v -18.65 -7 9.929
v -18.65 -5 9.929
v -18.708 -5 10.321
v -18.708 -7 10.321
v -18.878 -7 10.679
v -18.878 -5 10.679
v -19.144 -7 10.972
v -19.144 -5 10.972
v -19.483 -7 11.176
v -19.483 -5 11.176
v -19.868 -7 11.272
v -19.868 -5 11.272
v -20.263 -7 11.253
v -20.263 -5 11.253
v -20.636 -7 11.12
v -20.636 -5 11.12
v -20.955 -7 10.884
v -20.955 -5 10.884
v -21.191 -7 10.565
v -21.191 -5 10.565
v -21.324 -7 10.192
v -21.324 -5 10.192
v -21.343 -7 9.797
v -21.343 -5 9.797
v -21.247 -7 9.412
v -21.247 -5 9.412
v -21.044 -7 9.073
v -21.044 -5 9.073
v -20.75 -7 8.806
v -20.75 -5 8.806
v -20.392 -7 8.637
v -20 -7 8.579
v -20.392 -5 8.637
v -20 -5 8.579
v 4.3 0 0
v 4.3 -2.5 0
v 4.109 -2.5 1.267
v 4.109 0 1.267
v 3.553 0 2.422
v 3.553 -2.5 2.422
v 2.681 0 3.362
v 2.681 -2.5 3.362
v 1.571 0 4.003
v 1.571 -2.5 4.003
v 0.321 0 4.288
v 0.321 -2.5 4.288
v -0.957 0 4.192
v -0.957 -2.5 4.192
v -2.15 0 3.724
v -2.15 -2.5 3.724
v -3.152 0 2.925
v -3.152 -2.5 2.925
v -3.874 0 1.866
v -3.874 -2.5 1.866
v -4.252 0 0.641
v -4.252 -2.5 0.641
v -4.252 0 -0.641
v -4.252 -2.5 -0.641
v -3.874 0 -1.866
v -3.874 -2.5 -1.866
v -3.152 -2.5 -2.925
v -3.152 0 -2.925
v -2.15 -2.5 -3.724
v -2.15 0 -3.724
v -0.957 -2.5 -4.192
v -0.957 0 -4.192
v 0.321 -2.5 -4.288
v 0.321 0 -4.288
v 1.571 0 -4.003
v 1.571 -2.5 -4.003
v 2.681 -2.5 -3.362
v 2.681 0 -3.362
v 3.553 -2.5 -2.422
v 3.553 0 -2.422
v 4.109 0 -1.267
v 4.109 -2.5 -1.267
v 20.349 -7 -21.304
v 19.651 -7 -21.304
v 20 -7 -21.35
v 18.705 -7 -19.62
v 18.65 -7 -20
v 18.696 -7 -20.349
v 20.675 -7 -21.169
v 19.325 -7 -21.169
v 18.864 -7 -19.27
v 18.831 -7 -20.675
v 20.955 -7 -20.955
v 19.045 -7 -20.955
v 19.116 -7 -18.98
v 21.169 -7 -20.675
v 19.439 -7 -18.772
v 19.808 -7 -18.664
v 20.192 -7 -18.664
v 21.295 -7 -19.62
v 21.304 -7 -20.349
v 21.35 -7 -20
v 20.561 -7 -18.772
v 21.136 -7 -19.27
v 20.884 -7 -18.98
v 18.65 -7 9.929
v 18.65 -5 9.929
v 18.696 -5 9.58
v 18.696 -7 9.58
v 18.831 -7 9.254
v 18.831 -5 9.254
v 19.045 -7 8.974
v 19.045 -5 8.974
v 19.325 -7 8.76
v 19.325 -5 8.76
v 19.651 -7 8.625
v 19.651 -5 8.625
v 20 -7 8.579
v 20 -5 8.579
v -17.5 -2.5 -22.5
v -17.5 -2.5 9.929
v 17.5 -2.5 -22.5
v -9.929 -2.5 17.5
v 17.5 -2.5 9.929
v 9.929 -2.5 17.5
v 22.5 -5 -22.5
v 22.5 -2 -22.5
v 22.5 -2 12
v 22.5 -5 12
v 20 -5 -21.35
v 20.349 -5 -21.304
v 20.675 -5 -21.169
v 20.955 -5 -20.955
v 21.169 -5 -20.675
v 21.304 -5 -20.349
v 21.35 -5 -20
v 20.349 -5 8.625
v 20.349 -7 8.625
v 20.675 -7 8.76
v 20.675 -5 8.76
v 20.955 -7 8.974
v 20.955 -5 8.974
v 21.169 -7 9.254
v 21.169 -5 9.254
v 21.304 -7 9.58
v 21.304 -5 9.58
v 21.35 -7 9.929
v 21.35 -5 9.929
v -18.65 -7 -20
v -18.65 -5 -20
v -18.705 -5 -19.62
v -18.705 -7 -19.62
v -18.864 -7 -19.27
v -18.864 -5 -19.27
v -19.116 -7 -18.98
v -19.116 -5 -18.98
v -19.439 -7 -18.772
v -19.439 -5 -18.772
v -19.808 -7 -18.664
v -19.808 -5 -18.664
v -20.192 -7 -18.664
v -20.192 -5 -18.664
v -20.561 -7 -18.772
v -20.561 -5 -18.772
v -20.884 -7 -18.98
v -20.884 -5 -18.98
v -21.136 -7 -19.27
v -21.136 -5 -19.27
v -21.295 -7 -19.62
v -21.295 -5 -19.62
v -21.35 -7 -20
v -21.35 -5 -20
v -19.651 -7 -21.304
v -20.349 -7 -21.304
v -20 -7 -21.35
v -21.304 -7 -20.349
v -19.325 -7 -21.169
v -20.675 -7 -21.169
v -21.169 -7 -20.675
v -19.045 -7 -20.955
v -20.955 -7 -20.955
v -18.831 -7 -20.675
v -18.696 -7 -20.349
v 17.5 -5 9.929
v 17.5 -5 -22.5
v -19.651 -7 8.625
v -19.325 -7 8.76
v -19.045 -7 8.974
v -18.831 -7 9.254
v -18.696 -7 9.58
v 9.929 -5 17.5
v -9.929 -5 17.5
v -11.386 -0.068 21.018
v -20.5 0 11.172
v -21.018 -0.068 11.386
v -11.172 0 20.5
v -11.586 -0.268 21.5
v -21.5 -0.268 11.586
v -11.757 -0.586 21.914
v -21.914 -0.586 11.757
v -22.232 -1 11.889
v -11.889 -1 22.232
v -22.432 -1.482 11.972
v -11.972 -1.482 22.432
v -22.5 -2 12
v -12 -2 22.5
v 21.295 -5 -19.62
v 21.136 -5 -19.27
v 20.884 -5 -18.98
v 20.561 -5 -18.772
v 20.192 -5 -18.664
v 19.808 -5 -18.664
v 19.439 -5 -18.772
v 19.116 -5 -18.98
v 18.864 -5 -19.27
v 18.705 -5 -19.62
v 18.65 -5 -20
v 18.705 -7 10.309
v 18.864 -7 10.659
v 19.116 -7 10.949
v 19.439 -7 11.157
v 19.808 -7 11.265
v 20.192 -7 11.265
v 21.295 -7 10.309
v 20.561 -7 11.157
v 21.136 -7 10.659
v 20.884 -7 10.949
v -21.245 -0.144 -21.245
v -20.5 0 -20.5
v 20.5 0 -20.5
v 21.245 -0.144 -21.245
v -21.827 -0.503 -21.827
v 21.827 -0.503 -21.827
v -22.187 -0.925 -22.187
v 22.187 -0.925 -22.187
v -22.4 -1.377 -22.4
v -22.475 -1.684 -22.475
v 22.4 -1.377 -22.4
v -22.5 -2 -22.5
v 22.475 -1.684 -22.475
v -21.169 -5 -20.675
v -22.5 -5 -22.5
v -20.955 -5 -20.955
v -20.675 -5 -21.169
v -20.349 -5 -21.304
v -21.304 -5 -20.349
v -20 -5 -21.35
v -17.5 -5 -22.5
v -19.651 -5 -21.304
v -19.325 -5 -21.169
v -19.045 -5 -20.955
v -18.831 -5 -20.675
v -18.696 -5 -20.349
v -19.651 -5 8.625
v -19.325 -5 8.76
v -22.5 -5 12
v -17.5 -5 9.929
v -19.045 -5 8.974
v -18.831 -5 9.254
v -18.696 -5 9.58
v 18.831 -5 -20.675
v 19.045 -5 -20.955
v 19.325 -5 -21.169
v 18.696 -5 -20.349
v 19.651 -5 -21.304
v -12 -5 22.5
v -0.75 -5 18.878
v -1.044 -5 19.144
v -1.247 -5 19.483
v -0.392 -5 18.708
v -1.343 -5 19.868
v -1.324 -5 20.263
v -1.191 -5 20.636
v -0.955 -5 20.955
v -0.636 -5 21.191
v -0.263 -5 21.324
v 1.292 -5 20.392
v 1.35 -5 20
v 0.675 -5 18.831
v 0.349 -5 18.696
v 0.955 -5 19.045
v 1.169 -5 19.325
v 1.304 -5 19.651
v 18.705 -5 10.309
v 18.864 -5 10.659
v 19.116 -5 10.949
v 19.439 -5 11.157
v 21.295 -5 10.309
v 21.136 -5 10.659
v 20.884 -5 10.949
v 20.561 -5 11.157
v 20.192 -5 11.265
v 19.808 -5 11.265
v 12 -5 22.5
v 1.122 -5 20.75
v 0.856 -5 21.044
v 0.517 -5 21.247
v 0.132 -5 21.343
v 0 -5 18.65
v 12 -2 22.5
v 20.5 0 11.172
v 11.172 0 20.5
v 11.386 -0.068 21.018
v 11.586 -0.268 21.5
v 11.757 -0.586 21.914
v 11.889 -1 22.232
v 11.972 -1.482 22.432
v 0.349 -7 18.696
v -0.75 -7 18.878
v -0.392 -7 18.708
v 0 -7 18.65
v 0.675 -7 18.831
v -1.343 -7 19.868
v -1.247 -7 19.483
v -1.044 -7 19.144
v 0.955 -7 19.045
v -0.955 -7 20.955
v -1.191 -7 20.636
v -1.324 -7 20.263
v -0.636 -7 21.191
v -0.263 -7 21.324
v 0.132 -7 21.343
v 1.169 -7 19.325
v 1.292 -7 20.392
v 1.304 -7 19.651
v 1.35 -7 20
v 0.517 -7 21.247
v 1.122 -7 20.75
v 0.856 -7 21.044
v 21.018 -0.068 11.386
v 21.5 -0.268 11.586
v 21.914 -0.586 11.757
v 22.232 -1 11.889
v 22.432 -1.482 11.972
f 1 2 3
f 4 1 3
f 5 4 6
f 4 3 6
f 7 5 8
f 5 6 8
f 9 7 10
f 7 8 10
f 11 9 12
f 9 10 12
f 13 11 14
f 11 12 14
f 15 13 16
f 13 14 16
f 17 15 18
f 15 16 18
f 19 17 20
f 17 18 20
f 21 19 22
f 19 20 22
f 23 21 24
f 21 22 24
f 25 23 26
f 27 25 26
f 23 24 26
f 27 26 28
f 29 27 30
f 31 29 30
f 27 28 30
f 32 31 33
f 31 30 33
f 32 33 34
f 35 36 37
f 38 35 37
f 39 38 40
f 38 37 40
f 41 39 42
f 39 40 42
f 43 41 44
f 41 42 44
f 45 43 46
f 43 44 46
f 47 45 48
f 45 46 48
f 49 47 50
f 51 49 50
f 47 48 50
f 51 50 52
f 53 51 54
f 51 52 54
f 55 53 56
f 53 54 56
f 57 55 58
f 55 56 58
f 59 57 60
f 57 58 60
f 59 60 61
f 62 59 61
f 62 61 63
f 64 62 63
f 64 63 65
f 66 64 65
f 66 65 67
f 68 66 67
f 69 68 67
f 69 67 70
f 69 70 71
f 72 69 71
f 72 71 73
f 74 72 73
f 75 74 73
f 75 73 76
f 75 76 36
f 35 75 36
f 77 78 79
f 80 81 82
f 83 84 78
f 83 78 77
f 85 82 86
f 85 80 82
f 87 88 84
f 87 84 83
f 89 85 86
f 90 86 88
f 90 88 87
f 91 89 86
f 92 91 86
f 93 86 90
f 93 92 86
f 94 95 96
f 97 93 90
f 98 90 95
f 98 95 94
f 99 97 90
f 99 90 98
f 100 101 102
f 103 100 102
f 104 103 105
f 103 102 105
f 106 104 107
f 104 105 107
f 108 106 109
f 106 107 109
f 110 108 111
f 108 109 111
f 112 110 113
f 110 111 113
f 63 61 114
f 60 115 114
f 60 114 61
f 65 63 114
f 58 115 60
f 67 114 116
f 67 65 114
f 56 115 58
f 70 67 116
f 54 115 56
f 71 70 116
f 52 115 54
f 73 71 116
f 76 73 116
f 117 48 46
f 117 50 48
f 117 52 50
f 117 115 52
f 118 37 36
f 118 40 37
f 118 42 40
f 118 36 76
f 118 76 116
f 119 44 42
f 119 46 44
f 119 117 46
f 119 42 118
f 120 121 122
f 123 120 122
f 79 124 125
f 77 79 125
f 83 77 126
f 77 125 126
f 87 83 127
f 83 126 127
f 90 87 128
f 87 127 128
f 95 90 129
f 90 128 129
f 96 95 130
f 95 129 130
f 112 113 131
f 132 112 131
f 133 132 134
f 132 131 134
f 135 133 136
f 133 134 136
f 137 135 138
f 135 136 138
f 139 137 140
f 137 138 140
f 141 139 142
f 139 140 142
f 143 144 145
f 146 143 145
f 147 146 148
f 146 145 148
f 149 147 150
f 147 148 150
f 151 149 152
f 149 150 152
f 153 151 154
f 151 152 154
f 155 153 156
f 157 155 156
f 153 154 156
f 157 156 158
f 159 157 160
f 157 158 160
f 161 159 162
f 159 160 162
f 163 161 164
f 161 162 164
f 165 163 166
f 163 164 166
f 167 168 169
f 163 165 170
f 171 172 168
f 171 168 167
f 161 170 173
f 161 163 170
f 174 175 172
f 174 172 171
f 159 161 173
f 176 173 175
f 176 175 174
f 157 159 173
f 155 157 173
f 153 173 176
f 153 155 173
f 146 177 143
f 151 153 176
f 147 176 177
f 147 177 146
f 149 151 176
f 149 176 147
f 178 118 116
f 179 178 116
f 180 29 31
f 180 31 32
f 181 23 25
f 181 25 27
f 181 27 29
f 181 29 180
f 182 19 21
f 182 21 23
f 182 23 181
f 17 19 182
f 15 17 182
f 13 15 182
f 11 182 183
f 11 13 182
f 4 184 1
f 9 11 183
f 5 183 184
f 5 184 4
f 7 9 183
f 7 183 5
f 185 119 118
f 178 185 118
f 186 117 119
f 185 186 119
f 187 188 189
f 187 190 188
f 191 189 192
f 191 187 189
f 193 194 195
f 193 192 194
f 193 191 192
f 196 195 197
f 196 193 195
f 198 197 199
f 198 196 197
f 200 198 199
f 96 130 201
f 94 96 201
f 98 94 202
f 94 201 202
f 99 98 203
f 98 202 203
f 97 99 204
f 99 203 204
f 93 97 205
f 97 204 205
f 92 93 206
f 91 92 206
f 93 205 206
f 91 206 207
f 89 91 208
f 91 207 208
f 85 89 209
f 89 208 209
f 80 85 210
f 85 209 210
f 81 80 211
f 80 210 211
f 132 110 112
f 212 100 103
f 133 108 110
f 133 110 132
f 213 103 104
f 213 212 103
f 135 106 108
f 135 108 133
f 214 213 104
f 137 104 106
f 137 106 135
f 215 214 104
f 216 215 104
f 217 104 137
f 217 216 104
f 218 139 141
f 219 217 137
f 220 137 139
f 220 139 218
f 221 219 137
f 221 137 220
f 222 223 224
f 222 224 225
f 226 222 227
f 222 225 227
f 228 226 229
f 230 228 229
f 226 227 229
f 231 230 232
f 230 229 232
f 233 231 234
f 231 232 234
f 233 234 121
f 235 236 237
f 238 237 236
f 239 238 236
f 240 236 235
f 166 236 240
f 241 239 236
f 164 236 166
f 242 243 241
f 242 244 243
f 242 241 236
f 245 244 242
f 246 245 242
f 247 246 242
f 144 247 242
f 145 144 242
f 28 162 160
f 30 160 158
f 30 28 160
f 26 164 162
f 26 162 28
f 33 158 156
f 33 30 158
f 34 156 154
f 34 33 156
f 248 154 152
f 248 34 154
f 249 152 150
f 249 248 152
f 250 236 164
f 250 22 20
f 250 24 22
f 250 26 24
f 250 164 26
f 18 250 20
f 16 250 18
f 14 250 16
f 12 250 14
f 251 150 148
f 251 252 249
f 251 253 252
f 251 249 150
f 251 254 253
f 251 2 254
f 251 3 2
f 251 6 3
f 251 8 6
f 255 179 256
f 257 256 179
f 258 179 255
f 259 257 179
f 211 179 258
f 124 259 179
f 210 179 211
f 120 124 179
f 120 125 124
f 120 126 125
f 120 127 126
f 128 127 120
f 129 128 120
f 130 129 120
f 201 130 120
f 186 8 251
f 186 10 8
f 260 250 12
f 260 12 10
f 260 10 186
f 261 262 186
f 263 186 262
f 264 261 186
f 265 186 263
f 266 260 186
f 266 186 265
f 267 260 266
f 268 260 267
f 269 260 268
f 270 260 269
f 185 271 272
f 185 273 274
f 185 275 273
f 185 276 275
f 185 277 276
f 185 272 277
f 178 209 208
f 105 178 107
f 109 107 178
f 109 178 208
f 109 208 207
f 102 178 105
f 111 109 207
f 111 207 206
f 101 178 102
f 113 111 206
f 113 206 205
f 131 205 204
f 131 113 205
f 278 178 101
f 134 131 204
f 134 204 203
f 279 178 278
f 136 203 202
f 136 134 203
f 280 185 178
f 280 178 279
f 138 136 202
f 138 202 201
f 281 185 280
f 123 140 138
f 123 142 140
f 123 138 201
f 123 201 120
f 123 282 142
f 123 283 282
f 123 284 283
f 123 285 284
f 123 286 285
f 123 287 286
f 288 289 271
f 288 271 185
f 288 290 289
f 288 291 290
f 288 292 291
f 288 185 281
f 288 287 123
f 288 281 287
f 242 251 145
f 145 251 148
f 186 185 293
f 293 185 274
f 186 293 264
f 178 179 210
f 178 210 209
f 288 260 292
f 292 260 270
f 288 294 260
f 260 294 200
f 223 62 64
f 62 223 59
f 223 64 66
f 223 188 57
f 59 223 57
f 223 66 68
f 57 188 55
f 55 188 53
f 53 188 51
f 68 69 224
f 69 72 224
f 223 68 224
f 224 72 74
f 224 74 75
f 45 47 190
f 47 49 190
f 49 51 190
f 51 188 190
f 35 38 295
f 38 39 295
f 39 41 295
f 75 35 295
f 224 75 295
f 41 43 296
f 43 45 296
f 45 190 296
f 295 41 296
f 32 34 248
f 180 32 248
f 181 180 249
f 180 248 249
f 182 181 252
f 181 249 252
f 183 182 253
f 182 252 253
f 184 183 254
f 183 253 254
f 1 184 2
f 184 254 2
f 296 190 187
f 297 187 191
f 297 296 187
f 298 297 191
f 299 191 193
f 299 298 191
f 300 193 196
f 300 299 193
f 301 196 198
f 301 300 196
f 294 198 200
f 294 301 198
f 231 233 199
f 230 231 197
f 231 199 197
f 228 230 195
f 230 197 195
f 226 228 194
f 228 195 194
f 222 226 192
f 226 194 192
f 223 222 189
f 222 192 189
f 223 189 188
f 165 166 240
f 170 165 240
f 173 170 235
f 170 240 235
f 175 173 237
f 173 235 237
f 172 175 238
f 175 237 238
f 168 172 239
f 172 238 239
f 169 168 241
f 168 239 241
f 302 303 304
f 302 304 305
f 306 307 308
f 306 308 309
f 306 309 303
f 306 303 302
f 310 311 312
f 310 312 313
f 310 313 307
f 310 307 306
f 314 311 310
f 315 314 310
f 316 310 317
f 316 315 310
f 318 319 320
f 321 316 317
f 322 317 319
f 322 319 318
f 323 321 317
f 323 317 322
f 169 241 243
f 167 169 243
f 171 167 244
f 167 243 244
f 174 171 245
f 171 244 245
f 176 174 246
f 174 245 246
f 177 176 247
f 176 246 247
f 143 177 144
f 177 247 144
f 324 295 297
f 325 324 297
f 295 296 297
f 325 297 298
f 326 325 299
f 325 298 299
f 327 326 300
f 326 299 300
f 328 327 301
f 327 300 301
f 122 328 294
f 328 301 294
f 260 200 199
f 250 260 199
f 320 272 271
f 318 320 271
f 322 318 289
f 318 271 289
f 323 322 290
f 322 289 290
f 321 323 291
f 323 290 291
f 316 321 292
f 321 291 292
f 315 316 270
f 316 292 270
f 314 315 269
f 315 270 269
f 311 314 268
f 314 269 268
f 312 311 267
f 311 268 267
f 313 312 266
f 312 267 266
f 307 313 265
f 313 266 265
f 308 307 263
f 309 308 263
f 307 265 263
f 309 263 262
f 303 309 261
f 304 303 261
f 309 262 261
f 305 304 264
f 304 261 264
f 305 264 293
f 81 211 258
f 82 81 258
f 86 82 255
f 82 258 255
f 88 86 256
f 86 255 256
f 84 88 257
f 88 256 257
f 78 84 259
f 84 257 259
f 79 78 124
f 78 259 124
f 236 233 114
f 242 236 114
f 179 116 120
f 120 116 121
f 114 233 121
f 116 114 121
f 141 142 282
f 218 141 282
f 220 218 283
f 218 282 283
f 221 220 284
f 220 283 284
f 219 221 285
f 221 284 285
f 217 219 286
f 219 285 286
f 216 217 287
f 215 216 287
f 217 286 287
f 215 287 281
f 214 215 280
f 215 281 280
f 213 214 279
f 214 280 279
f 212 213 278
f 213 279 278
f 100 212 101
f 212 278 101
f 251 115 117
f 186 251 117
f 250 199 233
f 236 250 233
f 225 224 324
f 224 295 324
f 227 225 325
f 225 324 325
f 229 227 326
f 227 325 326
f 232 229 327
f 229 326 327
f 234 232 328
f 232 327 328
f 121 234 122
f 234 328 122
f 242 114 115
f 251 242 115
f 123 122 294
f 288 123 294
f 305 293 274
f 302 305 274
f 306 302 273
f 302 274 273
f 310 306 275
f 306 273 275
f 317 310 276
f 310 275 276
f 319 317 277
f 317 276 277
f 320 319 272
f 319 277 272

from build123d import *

# Parameters (mm, degrees)
F0_W     = 45
F0_H     = 45
F1_DEPTH = 2.5
F2_SIZE  = 10.5
F4_DEPTH = 2.5
F5_R     = 2
F3_R     = 4.3
F6_DEPTH = 25
F8_DEPTH = 2


with BuildPart() as f1:
    # F0 (on Front) → F1 (new body)
    with BuildSketch(Plane.XZ):
        Rectangle(F0_W, F0_H)
    extrude(amount=F1_DEPTH)

    # F2
    f2_edges = [f1.edges().sort_by_distance(p)[0] for p in [
        (-22.5, -1.25, 22.5),
        (22.5, -1.25, 22.5),
    ]]
    chamfer(f2_edges, length=F2_SIZE)

    # F3 (on face) → F4 (join)
    with BuildSketch(Plane.XZ.offset(2.5)):
        Polygon((-17.5, -22.5), (-17.5, 9.928932), (-9.928932, 17.5), (9.928932, 17.5), (17.5, 9.928932), (17.5, -22.5), (22.5, -22.5), (22.5, 12), (12, 22.5), (-12, 22.5), (-22.5, 12), (-22.5, -22.5), align=None)
    extrude(amount=F4_DEPTH)

    # F5
    f5_edges = [f1.edges().sort_by_distance(p)[0] for p in [
        (22.5, 0, -5.25),
        (17.25, 0, 17.25),
        (0, 0, -22.5),
        (0, 0, 22.5),
        (-22.5, 0, -5.25),
        (-17.25, 0, 17.25),
    ]]
    fillet(f5_edges, radius=F5_R)

    # F3 (on face) → F6 (cut)
    with BuildSketch(Plane.XZ.offset(2.5)):
        Circle(F3_R)
    extrude(amount=-F6_DEPTH, mode=Mode.SUBTRACT)

    # F7 (on face) → F8 (join)
    with BuildSketch(Plane.XZ.offset(5)):
        with BuildLine():
            ThreePointArc((-20, 8.578932), (-19.045406, 8.974338), (-18.65, 9.928932))
            Line((-18.65, 9.928932), (-20, 9.928932))
            Line((-20, 9.928932), (-20, 8.578932))
        make_face()
        with BuildLine():
            Line((-20, 9.928932), (-18.65, 9.928932))
            ThreePointArc((-18.65, 9.928932), (-20.954594, 10.883526), (-20, 8.578932))
            Line((-20, 8.578932), (-20, 9.928932))
        make_face()
        with BuildLine():
            ThreePointArc((-21.35, -20), (-20.954594, -20.954594), (-20, -21.35))
            Line((-20, -21.35), (-20, -20))
            Line((-20, -20), (-21.35, -20))
        make_face()
        with BuildLine():
            Line((-20, -20), (-20, -21.35))
            ThreePointArc((-20, -21.35), (-19.045406, -20.954594), (-18.65, -20))
            ThreePointArc((-18.65, -20), (-20, -18.65), (-21.35, -20))
            Line((-21.35, -20), (-20, -20))
        make_face()
        with BuildLine():
            Line((20, -20), (18.65, -20))
            ThreePointArc((18.65, -20), (19.045406, -20.954594), (20, -21.35))
            Line((20, -21.35), (20, -20))
        make_face()
        with BuildLine():
            ThreePointArc((21.35, -20), (20, -18.65), (18.65, -20))
            Line((18.65, -20), (20, -20))
            Line((20, -20), (20, -21.35))
            ThreePointArc((20, -21.35), (20.954594, -20.954594), (21.35, -20))
        make_face()
        with BuildLine():
            Line((20, 9.928932), (18.65, 9.928932))
            ThreePointArc((18.65, 9.928932), (19.045406, 8.974338), (20, 8.578932))
            Line((20, 8.578932), (20, 9.928932))
        make_face()
        with BuildLine():
            ThreePointArc((21.35, 9.928932), (20, 11.278932), (18.65, 9.928932))
            Line((18.65, 9.928932), (20, 9.928932))
            Line((20, 9.928932), (20, 8.578932))
            ThreePointArc((20, 8.578932), (20.954594, 8.974338), (21.35, 9.928932))
        make_face()
        with BuildLine():
            ThreePointArc((1.35, 20), (-0.954594, 20.954594), (0, 18.65))
            ThreePointArc((0, 18.65), (0.954594, 19.045406), (1.35, 20))
        make_face()
    extrude(amount=F8_DEPTH)


solid = f1.part
